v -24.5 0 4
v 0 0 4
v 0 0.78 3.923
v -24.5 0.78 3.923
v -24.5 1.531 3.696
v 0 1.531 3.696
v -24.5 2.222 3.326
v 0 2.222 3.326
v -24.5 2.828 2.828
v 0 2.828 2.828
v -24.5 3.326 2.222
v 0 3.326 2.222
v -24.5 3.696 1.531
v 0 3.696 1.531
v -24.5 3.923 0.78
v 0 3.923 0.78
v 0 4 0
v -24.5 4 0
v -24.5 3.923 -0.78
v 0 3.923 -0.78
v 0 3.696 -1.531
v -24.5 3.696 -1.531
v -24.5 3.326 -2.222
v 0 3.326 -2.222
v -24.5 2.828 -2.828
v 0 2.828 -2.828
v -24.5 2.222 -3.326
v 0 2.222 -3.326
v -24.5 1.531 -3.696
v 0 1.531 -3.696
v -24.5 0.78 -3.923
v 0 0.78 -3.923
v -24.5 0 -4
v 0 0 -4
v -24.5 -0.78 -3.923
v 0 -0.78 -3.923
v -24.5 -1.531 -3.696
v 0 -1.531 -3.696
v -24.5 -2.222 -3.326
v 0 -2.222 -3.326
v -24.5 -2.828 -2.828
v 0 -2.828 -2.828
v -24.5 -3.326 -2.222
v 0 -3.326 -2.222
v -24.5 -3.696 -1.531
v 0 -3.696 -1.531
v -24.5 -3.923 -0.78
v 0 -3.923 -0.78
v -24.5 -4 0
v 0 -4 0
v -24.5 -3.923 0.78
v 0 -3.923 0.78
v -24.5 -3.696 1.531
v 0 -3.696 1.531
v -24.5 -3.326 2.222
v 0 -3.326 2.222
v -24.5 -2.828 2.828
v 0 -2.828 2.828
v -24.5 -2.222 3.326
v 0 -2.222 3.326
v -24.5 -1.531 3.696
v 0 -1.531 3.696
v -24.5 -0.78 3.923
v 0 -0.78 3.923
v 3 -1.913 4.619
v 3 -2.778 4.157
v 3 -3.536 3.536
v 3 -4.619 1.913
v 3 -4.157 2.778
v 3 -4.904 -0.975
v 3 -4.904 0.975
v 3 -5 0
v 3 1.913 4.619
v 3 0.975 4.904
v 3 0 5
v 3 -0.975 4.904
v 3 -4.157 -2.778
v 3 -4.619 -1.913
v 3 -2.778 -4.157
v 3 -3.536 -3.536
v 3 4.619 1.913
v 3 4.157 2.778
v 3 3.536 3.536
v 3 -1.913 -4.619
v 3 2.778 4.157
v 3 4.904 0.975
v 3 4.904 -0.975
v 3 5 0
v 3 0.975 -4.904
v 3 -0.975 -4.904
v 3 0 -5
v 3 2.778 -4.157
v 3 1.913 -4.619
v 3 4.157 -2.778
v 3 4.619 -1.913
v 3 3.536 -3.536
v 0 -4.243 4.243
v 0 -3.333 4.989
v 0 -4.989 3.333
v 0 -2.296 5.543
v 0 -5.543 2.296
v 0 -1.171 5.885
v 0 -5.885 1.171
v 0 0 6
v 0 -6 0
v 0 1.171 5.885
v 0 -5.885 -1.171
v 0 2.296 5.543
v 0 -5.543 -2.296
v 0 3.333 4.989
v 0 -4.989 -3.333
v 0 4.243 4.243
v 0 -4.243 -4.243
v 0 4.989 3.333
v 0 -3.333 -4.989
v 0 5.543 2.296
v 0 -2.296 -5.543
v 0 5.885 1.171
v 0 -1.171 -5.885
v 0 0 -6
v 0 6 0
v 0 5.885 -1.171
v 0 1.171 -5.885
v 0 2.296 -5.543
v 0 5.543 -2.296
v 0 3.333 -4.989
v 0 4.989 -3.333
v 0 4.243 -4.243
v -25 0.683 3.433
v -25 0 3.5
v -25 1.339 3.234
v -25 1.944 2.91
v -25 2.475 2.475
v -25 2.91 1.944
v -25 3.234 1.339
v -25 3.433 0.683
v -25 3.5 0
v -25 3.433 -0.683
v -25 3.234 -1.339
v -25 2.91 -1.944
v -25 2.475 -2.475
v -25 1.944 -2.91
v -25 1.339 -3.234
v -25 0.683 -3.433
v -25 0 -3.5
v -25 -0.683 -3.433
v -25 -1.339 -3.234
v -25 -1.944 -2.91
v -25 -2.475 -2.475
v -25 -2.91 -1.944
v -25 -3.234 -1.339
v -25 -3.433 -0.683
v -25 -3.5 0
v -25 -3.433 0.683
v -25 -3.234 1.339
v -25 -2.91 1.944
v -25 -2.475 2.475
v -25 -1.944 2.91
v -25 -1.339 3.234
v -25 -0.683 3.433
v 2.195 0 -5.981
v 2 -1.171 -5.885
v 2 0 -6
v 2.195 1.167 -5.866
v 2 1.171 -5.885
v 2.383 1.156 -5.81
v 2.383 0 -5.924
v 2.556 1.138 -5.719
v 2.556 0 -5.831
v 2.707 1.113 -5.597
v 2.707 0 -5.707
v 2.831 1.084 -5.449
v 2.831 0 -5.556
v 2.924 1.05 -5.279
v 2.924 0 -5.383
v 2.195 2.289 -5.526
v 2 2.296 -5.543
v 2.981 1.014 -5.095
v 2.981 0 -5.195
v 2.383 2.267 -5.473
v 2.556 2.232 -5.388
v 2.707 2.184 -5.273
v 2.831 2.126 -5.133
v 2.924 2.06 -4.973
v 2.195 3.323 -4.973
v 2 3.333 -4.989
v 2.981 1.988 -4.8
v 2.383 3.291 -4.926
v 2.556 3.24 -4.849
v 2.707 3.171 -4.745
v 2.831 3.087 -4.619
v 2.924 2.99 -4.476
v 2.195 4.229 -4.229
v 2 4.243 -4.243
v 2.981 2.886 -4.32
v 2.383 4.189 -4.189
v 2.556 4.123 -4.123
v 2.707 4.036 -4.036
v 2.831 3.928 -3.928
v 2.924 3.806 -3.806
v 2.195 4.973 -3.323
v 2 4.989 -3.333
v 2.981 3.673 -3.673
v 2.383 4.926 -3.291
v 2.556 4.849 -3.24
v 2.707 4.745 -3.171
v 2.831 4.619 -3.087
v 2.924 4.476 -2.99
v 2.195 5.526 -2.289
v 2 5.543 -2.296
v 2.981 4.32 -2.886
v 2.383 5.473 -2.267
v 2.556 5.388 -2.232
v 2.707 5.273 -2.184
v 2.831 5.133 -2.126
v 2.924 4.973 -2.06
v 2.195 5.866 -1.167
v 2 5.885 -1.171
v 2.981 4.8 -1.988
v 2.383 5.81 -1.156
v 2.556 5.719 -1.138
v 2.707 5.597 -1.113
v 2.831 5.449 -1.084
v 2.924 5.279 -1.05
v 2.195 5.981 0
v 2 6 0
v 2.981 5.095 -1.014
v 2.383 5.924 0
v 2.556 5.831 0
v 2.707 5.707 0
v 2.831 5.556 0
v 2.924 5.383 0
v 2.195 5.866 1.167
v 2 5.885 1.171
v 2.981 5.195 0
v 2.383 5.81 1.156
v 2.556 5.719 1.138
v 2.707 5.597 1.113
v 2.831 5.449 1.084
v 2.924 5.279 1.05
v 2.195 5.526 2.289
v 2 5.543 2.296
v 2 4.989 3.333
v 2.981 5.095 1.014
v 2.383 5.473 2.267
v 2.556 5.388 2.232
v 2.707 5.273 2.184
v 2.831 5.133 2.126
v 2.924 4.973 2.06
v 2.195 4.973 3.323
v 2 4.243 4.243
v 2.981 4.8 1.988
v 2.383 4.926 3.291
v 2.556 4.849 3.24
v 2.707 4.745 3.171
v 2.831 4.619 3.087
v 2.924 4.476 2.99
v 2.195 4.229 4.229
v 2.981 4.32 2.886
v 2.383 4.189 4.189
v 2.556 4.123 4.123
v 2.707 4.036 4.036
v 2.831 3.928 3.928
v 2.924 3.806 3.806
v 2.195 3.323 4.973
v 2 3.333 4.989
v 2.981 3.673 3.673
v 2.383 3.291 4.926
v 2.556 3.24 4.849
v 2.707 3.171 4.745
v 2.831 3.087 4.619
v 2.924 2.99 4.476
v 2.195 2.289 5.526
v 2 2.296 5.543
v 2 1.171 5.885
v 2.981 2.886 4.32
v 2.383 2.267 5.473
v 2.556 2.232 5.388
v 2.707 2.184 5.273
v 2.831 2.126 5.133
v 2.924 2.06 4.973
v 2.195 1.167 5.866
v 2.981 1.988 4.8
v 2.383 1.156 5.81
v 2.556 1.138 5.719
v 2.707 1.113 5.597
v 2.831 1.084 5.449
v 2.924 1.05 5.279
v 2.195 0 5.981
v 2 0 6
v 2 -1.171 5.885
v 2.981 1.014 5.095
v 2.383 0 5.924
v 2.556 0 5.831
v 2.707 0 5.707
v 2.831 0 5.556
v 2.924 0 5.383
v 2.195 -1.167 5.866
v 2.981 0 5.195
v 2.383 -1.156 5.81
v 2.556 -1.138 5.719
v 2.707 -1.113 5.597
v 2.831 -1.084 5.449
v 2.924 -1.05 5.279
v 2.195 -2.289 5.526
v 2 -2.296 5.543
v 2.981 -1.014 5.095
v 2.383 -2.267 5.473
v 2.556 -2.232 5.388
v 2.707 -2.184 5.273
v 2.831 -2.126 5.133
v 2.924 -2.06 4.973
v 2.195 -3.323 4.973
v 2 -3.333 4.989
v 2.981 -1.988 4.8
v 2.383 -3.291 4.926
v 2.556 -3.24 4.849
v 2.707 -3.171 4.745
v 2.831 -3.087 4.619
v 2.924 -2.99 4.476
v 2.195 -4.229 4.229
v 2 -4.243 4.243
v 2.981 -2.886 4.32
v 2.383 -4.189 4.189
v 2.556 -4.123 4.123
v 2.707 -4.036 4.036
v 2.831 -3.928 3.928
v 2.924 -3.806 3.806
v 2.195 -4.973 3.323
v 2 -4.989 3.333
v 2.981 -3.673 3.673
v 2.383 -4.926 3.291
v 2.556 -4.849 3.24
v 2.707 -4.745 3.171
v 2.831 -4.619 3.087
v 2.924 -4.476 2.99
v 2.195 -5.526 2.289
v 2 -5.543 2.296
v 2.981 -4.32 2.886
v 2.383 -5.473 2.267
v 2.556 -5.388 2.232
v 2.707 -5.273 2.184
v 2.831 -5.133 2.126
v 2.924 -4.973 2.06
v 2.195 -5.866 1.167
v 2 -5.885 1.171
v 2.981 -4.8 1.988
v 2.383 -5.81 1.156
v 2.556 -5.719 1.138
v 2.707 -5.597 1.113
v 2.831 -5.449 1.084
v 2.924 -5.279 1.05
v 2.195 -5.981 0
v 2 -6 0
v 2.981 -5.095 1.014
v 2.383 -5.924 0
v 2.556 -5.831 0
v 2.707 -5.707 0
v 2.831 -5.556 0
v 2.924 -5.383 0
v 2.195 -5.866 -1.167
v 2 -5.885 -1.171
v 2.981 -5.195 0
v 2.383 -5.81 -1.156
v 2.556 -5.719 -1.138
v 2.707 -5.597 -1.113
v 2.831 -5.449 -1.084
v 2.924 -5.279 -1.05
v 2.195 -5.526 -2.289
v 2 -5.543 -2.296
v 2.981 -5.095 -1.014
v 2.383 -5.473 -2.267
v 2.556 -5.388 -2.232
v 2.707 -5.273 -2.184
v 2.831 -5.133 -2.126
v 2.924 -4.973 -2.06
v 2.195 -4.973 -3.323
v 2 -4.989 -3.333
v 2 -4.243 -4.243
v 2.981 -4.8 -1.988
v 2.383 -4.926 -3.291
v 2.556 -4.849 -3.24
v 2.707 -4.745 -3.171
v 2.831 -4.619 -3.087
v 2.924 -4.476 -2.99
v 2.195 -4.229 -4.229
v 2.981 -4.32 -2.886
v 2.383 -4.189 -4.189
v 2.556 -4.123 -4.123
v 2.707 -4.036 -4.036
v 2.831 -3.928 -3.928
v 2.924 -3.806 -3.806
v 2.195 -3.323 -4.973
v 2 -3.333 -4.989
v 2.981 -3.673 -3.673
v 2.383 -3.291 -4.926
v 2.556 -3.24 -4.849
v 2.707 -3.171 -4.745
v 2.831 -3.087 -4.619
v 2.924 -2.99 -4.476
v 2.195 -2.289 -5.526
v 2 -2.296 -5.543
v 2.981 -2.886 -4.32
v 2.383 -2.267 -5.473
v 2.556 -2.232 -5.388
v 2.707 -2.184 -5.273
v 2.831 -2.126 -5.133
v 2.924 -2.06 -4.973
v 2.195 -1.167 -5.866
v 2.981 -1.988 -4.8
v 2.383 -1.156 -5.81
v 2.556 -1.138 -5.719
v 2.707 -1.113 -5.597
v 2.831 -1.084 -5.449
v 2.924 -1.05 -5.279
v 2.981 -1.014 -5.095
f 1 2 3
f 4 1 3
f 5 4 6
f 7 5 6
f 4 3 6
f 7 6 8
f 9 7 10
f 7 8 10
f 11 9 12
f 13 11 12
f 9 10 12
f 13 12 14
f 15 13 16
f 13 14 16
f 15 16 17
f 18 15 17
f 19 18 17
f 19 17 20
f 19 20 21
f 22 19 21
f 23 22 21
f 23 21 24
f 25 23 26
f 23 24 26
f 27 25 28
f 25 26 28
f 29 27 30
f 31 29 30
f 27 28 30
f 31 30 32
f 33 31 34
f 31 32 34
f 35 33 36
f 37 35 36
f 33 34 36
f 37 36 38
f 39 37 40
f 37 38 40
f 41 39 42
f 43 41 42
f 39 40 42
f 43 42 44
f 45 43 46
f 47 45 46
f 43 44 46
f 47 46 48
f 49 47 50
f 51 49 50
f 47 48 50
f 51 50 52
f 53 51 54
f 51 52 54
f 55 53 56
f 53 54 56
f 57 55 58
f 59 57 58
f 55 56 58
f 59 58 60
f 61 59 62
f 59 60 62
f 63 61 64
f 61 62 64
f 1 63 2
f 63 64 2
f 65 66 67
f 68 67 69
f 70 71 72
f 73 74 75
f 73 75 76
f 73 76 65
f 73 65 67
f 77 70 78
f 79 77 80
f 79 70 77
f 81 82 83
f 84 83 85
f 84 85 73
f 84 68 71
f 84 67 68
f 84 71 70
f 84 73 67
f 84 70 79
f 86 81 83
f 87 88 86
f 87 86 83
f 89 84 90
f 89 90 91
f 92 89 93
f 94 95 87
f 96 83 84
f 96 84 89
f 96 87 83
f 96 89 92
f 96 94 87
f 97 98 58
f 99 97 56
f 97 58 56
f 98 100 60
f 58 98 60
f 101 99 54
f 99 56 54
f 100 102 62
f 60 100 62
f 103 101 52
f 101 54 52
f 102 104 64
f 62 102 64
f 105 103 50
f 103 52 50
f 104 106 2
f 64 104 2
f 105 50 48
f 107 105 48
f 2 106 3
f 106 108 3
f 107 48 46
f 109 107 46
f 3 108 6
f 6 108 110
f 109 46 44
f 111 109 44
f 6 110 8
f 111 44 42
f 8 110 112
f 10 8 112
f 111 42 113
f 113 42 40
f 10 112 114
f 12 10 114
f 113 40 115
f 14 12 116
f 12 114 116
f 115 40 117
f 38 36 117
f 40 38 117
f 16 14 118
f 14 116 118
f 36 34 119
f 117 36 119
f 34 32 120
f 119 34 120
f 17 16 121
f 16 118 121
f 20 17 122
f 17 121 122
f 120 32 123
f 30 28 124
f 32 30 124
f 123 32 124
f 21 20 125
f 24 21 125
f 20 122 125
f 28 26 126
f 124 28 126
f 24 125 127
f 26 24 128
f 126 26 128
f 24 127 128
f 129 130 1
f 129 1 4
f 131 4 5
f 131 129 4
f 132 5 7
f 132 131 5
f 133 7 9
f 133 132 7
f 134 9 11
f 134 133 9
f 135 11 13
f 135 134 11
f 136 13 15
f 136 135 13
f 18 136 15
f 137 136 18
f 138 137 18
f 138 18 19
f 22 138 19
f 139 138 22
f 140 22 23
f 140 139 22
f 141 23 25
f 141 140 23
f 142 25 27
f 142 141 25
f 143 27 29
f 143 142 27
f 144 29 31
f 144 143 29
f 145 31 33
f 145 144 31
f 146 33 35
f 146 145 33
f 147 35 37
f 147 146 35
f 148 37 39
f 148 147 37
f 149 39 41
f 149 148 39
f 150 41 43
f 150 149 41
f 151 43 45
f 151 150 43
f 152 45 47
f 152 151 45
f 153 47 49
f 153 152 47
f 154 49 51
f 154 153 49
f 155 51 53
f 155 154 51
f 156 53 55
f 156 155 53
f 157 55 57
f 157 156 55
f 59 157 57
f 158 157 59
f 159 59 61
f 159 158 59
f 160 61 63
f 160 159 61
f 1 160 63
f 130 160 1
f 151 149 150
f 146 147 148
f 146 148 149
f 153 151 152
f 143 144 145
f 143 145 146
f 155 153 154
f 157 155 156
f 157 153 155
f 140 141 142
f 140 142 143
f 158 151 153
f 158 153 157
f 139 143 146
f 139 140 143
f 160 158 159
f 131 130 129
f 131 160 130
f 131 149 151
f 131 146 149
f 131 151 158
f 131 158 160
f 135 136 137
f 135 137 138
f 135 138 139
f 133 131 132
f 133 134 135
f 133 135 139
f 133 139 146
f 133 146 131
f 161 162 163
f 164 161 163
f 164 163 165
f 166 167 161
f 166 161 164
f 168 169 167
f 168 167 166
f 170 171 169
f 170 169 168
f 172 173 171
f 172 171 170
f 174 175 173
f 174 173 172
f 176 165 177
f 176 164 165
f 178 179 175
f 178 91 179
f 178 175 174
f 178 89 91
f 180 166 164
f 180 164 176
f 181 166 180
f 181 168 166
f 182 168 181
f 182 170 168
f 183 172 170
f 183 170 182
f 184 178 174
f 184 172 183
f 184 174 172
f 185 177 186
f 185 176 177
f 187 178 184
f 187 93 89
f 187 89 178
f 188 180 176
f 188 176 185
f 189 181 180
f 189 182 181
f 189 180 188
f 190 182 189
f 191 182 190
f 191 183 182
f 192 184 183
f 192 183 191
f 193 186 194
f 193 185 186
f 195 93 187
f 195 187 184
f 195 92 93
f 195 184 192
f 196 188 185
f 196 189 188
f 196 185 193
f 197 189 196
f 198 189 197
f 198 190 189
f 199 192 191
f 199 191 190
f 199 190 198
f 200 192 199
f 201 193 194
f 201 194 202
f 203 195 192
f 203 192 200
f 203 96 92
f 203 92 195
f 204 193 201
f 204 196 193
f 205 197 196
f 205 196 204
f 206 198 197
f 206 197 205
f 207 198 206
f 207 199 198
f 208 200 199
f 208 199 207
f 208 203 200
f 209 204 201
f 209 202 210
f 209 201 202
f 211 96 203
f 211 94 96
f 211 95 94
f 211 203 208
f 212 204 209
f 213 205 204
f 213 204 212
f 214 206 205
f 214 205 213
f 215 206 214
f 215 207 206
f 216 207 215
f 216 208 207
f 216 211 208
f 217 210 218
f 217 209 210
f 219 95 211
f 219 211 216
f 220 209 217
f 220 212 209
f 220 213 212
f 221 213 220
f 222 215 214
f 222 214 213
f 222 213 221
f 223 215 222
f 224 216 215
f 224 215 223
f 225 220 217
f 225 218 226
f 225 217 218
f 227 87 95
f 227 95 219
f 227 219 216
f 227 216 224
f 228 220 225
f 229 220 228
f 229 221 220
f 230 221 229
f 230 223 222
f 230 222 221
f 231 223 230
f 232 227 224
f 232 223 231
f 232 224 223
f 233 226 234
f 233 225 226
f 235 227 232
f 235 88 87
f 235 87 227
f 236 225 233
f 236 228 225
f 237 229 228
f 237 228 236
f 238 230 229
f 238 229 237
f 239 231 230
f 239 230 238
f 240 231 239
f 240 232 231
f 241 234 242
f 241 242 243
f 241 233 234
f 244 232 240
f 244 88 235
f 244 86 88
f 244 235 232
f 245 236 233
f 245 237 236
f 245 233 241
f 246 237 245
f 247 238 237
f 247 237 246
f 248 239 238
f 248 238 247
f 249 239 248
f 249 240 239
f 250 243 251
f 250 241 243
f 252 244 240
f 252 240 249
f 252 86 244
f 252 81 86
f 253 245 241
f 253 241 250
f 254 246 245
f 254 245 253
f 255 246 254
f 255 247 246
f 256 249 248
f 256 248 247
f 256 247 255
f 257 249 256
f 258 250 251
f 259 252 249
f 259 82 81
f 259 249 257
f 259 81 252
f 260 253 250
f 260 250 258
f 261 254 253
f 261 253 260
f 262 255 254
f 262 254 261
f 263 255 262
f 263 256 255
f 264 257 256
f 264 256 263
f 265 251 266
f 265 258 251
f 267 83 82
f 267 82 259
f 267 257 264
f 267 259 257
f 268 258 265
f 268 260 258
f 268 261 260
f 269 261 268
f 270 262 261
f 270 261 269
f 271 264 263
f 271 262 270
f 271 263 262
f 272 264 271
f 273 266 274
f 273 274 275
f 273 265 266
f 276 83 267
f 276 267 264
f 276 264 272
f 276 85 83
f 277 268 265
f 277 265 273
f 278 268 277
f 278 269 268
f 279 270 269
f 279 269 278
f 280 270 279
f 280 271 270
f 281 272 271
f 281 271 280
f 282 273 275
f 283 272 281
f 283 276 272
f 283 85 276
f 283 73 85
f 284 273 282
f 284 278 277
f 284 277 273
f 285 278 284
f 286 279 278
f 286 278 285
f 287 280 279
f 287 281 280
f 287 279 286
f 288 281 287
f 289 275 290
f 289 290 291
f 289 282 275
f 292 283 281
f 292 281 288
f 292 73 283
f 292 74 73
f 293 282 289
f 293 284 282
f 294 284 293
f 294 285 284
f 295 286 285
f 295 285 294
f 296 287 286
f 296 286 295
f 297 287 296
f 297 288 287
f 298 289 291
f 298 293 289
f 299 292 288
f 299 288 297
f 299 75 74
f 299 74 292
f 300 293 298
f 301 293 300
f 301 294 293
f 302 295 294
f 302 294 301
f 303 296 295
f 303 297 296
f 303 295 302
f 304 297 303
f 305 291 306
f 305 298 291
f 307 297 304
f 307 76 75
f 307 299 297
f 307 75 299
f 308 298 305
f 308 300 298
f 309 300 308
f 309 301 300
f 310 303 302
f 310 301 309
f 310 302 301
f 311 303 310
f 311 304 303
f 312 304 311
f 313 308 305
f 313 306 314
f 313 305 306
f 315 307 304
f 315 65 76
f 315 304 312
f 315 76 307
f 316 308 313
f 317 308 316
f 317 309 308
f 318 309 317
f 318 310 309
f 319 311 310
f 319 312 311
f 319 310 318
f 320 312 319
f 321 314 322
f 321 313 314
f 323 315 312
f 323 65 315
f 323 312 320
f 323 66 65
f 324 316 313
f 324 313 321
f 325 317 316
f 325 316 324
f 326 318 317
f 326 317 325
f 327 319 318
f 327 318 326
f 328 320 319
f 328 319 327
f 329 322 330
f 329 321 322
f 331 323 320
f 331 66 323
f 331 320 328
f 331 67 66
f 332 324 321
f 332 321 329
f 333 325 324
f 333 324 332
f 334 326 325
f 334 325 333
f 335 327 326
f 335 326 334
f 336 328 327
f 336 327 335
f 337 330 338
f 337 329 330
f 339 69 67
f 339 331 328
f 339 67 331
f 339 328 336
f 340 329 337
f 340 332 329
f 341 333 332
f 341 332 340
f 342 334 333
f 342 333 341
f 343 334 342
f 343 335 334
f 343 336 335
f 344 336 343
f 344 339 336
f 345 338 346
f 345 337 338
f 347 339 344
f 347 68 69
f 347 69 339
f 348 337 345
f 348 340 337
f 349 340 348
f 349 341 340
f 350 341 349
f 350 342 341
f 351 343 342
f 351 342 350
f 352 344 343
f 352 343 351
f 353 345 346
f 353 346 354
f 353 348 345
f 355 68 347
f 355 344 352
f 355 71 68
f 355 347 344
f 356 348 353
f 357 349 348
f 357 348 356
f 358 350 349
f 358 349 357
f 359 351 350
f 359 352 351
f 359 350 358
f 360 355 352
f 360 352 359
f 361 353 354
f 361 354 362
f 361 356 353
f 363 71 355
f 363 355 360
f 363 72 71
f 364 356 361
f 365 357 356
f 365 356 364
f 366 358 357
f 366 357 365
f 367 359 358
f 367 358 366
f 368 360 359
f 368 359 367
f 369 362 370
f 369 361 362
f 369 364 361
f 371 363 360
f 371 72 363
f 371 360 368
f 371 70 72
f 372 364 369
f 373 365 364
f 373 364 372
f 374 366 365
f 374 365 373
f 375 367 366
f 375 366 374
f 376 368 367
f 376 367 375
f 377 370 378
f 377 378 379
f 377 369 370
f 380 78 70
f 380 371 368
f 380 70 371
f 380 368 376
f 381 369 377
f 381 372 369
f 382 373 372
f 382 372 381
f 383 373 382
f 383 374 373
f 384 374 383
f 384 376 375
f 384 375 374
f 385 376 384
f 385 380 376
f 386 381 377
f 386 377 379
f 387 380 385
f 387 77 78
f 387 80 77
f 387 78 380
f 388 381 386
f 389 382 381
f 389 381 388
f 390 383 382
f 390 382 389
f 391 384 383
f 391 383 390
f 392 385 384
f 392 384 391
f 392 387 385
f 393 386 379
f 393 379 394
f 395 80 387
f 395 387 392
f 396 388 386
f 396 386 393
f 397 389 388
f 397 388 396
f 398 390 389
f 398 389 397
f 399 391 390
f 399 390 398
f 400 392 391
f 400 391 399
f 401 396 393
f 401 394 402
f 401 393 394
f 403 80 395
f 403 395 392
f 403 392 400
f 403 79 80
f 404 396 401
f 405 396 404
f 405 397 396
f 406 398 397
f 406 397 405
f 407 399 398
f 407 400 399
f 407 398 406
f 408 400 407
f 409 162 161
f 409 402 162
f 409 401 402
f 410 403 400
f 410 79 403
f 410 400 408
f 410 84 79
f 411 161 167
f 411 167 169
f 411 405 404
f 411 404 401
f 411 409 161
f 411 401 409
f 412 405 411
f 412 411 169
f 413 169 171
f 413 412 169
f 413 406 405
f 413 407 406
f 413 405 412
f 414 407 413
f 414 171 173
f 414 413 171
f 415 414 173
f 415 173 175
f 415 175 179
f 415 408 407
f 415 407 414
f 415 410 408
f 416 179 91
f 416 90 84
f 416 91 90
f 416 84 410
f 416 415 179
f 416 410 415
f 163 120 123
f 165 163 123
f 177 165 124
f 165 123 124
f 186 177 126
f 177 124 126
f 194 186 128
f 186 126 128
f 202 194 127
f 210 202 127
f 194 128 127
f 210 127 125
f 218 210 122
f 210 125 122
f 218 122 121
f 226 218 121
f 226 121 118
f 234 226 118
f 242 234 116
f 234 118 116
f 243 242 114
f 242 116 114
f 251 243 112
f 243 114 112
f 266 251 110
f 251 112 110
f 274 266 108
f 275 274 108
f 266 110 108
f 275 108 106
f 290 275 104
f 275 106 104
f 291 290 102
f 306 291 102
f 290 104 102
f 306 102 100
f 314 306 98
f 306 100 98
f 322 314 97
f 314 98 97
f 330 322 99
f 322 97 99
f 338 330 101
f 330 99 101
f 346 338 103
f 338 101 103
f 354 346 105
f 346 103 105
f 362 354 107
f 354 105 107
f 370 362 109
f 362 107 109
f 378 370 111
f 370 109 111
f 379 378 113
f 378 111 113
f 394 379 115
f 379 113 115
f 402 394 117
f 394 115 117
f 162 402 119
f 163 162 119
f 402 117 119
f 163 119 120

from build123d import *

# Parameters (mm, degrees)
SKETCH1_R           = 6
BOSS_EXTRUDE1_DEPTH = 3
SKETCH3_R           = 4
BOSS_EXTRUDE2_DEPTH = 25
FILLET1_R           = 1
CHAMFER1_SIZE       = 0.5


with BuildPart() as part:
    # Sketch1 → Boss-Extrude1 (new body)
    with BuildSketch(Plane(origin=(0, 0, 0), x_dir=(0, 0, -1), z_dir=(1, 0, 0))):
        Circle(SKETCH1_R)
    extrude(amount=BOSS_EXTRUDE1_DEPTH)

    # Sketch3 → Boss-Extrude2 (add)
    with BuildSketch(Plane.ZY):
        Circle(SKETCH3_R)
    extrude(amount=BOSS_EXTRUDE2_DEPTH)

    # Fillet1
    fillet1_edges = [part.edges().sort_by_distance(p)[0] for p in [
        (3, 0, 6),
    ]]
    fillet(fillet1_edges, radius=FILLET1_R)

    # Chamfer1
    chamfer1_edges = [part.edges().sort_by_distance(p)[0] for p in [
        (-25, 0, -4),
    ]]
    chamfer(chamfer1_edges, length=CHAMFER1_SIZE)


solid = part.part
